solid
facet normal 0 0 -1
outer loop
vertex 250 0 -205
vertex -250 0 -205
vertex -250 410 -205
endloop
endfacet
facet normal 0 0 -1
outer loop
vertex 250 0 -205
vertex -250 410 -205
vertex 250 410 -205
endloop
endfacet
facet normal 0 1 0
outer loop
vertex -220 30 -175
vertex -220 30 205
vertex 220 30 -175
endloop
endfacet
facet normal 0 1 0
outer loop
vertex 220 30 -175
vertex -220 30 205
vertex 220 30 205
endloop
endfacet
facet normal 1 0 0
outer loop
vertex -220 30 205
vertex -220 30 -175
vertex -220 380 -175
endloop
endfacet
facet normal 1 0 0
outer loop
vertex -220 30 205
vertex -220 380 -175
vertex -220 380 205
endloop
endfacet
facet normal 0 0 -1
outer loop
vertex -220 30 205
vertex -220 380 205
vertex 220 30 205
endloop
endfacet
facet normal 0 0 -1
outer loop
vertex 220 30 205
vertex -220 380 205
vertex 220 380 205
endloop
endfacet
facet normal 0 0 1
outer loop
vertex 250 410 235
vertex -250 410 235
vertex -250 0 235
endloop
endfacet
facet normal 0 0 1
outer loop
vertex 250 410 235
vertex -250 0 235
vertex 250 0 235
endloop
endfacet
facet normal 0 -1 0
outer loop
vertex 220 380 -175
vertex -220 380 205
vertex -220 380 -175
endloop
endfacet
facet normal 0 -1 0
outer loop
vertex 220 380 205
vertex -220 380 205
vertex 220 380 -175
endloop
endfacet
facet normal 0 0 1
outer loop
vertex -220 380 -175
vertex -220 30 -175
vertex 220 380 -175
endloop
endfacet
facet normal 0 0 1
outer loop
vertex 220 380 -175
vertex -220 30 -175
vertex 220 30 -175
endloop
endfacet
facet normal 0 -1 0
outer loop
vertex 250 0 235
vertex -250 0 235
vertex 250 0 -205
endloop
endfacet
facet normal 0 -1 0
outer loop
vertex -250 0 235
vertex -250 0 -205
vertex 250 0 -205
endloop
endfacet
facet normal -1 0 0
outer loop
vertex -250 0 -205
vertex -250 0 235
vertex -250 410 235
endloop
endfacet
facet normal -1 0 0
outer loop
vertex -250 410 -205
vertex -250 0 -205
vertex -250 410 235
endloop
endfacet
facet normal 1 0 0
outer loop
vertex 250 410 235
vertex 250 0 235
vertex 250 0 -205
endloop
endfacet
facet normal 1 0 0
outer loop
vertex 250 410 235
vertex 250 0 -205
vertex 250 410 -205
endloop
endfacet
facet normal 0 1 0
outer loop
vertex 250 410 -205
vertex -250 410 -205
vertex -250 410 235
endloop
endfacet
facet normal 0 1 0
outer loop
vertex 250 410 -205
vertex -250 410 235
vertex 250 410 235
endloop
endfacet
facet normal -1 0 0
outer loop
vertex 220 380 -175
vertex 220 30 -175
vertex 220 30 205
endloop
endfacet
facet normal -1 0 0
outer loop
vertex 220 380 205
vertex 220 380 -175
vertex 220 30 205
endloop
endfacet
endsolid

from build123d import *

# Parameters (mm, degrees)
F0_W     = 500
F0_H     = 410
F1_DEPTH = 410
F2_T     = -30
F3_W     = 500
F3_H     = 410
F4_DEPTH = 30


with BuildPart() as f1:
    # F0 (on Front) → F1 (new body)
    with BuildSketch(Plane.XZ):
        Rectangle(F0_W, F0_H)
    extrude(amount=-F1_DEPTH)

    # F2
    f2_openings = [f1.faces().sort_by_distance(p)[0] for p in [
        (0, 205, 205),
    ]]
    offset(amount=F2_T, openings=f2_openings)

    # F3 (on face) → F4 (join)
    with BuildSketch(Plane.XY.offset(205)):
        with Locations((0, 205)):
            Rectangle(F3_W, F3_H)
    extrude(amount=F4_DEPTH)


solid = f1.part
